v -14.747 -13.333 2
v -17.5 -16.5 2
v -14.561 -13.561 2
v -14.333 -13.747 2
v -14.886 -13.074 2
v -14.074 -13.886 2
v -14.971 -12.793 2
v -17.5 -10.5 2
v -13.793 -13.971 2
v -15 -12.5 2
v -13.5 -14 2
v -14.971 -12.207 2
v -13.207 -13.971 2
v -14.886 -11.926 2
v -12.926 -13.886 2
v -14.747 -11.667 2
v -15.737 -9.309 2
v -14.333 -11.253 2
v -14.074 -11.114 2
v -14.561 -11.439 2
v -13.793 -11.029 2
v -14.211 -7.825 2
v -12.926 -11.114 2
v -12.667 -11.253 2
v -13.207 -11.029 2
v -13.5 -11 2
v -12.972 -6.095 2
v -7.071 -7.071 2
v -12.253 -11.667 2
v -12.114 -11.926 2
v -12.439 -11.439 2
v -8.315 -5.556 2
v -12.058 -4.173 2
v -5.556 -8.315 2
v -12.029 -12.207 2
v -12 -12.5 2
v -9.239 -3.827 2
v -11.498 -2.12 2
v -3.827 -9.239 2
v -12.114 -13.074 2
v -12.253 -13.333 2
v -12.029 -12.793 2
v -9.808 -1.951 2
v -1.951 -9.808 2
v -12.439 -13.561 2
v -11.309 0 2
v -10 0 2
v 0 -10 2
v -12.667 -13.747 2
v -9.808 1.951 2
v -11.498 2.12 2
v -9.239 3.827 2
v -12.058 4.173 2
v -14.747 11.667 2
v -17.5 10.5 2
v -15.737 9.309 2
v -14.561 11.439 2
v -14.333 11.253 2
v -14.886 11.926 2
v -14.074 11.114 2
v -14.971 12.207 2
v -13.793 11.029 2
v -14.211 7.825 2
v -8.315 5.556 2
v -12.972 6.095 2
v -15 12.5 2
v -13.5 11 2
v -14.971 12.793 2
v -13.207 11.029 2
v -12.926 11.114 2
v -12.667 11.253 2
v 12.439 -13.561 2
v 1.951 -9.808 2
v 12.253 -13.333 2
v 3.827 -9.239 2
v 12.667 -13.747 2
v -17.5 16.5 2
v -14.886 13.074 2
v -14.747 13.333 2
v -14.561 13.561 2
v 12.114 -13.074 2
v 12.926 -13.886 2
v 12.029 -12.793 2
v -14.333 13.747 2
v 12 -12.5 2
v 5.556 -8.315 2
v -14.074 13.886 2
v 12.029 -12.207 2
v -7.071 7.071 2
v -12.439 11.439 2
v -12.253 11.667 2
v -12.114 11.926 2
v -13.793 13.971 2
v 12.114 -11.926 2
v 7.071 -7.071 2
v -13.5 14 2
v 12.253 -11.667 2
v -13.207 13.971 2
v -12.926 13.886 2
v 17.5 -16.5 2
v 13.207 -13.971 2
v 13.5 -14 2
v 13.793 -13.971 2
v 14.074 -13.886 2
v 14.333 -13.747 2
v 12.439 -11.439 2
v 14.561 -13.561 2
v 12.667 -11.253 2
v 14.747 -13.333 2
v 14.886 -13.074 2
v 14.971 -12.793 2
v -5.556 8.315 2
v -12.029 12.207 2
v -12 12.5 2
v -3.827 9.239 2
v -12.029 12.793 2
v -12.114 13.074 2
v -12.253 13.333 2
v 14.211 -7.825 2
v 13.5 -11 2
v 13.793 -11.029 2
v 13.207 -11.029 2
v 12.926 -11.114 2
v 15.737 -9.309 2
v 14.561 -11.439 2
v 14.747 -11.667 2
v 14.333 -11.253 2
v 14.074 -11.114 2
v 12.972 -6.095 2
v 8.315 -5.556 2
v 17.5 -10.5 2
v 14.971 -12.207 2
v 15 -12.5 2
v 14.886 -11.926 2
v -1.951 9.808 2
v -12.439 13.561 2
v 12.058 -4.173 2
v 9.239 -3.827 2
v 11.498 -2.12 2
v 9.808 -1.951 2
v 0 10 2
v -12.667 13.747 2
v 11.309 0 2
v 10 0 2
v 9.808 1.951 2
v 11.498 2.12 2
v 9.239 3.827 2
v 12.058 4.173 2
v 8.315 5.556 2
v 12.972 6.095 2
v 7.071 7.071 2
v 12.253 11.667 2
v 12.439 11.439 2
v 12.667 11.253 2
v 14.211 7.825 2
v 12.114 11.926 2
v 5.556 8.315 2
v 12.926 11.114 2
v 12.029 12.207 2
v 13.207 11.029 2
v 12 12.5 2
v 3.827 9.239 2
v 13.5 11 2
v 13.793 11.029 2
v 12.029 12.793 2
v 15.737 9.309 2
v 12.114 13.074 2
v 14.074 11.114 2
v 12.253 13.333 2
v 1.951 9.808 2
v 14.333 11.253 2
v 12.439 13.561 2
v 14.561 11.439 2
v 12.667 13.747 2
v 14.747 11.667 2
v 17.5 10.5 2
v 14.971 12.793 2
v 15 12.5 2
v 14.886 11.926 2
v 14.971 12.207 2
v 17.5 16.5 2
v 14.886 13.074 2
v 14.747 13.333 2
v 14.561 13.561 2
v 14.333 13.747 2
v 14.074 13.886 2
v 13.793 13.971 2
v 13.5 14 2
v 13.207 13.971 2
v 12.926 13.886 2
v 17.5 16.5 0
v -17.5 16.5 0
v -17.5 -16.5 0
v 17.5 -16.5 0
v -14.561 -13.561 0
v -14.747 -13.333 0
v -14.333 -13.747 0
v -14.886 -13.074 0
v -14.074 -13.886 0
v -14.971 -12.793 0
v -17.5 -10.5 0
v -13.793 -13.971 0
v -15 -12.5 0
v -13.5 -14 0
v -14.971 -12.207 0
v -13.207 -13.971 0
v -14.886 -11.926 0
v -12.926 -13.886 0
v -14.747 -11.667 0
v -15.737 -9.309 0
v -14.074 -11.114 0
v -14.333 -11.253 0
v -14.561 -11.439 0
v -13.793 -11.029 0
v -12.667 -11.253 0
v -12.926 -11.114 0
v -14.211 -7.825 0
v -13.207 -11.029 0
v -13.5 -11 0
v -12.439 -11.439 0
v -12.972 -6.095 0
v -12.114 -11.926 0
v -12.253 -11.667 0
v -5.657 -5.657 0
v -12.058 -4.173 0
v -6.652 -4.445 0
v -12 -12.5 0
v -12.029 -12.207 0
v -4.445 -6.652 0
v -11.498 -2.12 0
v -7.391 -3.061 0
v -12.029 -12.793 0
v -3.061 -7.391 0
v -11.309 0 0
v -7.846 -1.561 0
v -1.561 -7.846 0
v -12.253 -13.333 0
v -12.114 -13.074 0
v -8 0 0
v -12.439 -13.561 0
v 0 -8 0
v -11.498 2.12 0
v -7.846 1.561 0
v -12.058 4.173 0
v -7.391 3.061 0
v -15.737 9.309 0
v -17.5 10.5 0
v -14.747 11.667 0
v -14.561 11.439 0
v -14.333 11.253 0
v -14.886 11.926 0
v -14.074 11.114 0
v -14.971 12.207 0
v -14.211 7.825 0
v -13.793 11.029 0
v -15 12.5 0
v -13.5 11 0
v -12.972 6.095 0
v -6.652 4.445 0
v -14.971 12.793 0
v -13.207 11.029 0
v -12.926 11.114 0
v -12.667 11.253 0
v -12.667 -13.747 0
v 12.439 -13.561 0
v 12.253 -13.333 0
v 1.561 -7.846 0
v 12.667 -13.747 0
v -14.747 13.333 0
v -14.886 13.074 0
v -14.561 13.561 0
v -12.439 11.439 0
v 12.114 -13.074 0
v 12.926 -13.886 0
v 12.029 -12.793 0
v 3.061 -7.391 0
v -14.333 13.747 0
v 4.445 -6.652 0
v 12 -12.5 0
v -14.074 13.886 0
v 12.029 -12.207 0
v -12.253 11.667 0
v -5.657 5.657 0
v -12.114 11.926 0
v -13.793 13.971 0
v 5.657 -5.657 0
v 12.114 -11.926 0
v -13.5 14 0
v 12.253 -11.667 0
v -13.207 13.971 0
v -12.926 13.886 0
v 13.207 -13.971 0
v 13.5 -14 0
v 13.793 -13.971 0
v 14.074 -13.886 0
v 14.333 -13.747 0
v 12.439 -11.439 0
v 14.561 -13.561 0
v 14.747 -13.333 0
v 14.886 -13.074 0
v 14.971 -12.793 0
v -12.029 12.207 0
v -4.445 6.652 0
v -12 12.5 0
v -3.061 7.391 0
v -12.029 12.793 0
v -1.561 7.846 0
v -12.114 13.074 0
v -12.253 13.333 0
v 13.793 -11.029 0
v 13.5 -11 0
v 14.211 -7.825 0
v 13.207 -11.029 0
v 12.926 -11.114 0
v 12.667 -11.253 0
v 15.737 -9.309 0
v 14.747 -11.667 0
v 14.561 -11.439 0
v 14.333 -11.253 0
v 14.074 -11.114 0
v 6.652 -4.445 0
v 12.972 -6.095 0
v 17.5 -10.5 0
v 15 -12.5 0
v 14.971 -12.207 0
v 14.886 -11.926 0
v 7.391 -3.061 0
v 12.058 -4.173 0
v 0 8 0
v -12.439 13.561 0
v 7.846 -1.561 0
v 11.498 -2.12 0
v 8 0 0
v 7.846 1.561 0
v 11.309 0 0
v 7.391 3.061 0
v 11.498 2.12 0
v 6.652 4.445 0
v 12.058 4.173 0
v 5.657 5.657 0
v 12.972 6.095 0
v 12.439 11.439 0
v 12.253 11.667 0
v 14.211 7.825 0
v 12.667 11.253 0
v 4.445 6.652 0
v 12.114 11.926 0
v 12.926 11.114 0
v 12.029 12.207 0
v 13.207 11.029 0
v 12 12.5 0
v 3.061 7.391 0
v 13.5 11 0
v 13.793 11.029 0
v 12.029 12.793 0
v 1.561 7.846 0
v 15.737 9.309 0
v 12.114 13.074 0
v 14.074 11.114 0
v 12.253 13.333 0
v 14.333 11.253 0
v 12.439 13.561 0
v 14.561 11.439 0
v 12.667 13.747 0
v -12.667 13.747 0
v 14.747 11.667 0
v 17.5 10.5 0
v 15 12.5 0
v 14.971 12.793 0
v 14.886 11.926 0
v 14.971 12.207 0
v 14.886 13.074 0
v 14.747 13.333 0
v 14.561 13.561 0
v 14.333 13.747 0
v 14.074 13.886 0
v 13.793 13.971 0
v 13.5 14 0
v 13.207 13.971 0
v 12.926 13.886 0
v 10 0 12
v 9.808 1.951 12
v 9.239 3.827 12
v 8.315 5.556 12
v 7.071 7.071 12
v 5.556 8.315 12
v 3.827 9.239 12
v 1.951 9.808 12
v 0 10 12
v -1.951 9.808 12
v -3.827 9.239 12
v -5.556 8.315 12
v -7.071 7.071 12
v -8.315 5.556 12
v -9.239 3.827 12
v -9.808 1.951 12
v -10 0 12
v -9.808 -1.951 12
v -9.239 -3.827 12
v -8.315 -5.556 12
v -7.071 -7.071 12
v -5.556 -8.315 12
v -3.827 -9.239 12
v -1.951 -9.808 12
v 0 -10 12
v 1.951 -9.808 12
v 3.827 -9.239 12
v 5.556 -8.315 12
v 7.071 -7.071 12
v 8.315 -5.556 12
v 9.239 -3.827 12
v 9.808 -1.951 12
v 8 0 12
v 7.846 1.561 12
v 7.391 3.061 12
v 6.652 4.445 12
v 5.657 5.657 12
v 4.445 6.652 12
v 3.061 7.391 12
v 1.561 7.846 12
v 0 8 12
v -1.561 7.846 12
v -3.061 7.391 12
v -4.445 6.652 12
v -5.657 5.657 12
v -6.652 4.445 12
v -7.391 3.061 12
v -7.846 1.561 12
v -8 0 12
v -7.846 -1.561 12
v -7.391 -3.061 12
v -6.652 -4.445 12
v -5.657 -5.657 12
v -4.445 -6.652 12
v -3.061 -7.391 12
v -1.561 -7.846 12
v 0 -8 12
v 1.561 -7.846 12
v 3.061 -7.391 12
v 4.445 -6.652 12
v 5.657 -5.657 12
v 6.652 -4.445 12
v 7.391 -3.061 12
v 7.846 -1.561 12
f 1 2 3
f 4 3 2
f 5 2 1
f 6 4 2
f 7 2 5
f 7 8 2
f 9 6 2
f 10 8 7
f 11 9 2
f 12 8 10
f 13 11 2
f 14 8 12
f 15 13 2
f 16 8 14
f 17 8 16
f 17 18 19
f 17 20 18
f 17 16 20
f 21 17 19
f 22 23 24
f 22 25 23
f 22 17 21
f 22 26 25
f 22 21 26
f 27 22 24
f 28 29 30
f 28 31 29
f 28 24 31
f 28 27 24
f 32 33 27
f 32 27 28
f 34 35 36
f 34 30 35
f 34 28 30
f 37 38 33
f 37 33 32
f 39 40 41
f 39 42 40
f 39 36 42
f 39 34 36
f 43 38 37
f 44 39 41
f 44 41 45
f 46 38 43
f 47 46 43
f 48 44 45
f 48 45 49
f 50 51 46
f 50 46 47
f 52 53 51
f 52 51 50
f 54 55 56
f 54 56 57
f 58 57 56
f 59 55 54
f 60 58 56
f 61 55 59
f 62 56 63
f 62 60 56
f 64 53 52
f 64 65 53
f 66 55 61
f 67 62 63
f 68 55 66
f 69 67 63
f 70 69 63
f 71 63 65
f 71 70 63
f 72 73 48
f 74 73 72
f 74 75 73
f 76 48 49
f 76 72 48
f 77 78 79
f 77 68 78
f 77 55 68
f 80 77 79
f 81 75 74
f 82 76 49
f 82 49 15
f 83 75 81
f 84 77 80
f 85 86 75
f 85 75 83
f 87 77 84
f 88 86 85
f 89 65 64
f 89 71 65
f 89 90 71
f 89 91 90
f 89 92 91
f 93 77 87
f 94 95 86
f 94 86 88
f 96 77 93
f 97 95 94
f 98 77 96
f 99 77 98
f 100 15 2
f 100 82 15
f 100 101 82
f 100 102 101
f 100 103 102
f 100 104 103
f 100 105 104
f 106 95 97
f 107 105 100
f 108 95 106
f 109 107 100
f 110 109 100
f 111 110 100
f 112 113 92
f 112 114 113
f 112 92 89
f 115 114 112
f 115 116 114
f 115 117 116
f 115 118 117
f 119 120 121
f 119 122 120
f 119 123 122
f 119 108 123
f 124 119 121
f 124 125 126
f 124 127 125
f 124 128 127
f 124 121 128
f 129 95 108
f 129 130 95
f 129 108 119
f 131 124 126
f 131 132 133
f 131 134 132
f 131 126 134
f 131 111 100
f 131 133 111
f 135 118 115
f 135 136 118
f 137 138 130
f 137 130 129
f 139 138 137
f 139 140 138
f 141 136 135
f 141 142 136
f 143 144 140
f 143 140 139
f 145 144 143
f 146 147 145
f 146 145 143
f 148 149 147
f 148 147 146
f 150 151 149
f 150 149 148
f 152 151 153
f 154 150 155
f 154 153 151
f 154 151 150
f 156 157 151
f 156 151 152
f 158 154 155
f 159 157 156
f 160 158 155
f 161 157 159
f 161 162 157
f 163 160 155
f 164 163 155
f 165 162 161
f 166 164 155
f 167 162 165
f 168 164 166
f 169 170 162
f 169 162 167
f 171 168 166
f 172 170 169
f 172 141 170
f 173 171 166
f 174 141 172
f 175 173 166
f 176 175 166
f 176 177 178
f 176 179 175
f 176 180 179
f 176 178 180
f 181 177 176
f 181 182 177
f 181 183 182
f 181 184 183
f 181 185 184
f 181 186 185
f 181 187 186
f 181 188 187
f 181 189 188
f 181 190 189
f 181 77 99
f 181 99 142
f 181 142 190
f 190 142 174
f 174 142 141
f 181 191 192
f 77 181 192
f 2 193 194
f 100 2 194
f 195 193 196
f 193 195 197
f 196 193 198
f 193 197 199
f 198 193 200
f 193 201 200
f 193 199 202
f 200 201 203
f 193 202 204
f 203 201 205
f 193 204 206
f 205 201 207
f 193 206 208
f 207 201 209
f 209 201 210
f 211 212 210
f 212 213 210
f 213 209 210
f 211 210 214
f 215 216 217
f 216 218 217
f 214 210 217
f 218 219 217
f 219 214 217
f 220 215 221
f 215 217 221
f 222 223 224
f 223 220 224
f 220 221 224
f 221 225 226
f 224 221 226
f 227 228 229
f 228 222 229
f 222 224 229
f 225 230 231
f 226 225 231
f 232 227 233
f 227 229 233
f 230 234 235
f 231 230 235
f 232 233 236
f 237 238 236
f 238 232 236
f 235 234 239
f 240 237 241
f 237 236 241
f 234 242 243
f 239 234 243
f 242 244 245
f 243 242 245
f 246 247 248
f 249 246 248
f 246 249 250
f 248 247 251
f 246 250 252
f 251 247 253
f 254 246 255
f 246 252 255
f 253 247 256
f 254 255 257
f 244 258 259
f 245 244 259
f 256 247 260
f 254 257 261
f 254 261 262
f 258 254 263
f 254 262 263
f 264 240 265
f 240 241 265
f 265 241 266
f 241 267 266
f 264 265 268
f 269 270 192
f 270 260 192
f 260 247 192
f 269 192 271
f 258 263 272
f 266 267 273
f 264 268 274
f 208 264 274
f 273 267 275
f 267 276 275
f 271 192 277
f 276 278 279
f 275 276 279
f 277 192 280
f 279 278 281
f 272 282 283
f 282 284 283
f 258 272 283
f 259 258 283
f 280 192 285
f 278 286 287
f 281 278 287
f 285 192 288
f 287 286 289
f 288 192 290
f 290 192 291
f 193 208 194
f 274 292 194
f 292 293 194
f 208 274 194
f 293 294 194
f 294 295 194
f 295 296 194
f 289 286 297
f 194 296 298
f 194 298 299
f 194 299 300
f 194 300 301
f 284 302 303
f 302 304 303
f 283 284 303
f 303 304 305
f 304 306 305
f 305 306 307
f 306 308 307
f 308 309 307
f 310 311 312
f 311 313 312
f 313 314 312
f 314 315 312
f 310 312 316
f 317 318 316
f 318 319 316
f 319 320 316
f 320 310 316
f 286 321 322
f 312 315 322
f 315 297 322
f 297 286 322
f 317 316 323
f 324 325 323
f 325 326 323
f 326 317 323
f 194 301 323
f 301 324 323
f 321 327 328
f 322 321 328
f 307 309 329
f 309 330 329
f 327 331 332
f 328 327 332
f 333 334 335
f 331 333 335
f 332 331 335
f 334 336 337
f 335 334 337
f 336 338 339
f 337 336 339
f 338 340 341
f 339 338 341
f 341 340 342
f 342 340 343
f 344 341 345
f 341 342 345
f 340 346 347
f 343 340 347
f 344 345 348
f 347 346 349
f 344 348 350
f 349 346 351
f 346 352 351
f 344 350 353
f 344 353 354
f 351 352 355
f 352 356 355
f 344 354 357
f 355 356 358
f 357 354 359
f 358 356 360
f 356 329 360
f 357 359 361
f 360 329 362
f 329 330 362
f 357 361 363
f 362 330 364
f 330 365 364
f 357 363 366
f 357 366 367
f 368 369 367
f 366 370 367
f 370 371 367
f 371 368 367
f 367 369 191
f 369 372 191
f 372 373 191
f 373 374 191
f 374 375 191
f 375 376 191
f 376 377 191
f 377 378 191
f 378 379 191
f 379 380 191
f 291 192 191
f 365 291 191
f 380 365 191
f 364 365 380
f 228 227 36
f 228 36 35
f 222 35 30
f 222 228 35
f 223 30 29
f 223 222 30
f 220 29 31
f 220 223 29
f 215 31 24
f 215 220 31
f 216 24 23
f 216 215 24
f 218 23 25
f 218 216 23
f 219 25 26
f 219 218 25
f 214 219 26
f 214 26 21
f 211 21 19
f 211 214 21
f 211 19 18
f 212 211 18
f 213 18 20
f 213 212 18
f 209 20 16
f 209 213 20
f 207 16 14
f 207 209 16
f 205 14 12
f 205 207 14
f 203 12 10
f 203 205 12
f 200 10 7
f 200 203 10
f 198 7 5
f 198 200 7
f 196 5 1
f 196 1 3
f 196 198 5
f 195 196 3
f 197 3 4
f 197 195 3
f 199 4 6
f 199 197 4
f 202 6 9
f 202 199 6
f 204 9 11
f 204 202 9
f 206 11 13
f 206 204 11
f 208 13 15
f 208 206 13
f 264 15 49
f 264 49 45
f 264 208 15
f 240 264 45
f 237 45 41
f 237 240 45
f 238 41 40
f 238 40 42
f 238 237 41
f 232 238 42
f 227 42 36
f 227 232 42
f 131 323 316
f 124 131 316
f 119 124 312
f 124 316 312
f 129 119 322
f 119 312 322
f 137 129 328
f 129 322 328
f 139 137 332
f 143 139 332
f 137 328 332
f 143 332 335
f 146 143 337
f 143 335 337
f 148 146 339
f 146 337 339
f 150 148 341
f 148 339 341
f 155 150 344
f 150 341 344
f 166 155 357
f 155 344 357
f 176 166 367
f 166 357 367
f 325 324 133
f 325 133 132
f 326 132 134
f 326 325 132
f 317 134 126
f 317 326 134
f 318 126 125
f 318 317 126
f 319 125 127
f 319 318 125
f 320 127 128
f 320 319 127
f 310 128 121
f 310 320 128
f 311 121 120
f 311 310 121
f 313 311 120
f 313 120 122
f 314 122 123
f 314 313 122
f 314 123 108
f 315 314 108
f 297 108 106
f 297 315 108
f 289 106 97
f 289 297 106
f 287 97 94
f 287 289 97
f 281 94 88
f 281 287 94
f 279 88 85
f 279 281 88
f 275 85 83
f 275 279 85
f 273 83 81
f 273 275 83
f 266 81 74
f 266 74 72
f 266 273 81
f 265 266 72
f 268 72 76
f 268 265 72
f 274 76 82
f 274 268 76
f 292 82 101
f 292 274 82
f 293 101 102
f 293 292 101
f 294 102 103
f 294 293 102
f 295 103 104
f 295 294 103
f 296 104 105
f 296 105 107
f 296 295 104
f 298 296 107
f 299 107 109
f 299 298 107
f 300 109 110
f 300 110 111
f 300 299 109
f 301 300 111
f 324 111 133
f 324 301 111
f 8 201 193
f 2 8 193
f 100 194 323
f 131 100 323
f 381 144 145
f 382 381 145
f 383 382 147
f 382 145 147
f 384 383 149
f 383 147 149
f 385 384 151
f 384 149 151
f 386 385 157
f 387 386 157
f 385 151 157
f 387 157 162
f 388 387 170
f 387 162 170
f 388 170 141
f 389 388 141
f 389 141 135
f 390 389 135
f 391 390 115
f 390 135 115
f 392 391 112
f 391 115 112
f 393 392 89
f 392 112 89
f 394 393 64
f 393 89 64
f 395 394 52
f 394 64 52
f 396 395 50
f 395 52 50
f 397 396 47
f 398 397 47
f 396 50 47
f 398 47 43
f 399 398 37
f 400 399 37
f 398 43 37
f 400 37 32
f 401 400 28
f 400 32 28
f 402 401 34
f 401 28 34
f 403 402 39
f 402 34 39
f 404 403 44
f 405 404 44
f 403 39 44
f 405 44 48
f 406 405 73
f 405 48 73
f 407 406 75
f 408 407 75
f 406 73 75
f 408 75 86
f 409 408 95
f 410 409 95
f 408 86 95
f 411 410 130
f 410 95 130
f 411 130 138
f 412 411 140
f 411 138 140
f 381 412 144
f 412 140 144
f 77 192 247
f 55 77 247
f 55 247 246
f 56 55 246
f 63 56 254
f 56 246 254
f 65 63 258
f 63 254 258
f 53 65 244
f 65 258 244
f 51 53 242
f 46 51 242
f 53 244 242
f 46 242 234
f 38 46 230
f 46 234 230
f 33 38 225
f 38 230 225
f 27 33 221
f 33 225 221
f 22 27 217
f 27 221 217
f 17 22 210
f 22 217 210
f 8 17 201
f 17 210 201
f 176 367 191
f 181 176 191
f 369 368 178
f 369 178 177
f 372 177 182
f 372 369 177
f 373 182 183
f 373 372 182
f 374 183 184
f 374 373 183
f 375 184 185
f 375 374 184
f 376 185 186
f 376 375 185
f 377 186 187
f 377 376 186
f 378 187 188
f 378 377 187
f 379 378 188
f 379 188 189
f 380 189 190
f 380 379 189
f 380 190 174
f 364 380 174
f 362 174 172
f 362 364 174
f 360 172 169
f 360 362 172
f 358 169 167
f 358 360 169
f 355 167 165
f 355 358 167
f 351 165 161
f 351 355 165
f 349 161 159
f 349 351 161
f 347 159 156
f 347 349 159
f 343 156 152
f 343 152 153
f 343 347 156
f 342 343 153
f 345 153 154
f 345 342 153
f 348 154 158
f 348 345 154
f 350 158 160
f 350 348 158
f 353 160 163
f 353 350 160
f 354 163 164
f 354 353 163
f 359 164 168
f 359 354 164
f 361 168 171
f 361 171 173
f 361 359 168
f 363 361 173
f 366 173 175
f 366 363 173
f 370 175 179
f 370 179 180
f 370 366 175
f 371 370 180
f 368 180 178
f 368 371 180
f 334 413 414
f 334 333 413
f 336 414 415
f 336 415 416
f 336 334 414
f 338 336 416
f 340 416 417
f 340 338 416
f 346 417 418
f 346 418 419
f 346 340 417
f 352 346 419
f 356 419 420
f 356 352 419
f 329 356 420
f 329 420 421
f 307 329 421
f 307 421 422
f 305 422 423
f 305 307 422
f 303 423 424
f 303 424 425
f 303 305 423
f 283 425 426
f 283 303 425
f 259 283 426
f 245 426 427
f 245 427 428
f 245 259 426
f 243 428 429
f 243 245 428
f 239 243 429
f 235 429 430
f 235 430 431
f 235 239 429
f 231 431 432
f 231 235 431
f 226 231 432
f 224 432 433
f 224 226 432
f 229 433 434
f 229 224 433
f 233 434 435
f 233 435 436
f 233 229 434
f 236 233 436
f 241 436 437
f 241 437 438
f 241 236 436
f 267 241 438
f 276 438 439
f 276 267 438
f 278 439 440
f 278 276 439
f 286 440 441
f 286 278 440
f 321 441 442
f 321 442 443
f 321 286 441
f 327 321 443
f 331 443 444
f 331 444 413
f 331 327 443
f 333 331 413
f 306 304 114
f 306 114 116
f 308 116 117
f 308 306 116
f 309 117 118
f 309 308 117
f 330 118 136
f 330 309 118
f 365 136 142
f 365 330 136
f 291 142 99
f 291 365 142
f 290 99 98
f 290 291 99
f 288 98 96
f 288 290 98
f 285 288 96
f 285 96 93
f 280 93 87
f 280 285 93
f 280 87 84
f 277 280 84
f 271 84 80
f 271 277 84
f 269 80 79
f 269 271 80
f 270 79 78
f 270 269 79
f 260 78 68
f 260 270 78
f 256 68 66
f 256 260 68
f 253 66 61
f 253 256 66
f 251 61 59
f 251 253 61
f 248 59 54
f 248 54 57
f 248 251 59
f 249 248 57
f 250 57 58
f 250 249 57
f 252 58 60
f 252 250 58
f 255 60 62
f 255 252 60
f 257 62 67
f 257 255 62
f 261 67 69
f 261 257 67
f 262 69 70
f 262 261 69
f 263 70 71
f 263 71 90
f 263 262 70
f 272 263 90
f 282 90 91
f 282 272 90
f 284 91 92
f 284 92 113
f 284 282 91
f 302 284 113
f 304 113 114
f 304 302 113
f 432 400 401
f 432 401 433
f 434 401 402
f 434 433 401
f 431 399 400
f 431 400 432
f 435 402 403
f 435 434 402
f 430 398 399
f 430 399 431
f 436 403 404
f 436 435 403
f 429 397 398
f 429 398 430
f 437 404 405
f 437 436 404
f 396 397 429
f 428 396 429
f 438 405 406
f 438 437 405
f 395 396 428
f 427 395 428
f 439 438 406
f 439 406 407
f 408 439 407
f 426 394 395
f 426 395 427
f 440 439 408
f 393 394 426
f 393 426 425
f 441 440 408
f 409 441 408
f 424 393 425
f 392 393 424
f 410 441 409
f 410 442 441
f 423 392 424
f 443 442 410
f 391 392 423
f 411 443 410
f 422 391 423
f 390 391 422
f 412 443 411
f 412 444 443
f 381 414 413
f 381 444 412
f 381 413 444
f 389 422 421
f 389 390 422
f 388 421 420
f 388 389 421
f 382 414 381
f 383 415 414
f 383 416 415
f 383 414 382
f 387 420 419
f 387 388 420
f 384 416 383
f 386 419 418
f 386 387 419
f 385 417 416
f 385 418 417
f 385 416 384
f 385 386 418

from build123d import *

# Parameters (mm, degrees)
SKETCH_1_R      = 1.5
SKETCH_1_R_2    = 8
EXTRUDE_1_DEPTH = 2
SKETCH_3_R      = 10
SKETCH_3_R_2    = 8
EXTRUDE_2_DEPTH = 10


with BuildPart() as part:
    # 草图1 → 凸台-拉伸1 (new body)
    with BuildSketch(Plane.XY):
        with BuildLine():
            Line((17.5, 16.5), (-17.5, 16.5))
            Line((-17.5, 16.5), (-17.5, 10.5))
            ThreePointArc((-17.5, 10.5), (-11.309475019, 0), (-17.5, -10.5))
            Line((-17.5, -10.5), (-17.5, -16.5))
            Line((-17.5, -16.5), (17.5, -16.5))
            Line((17.5, -16.5), (17.5, -10.5))
            ThreePointArc((17.5, -10.5), (11.309475019, 0), (17.5, 10.5))
            Line((17.5, 10.5), (17.5, 16.5))
        make_face()
        with Locations((-13.5, -12.5)):
            Circle(SKETCH_1_R, mode=Mode.SUBTRACT)
        with Locations((13.5, -12.5)):
            Circle(SKETCH_1_R, mode=Mode.SUBTRACT)
        Circle(SKETCH_1_R_2, mode=Mode.SUBTRACT)
        with Locations((-13.5, 12.5)):
            Circle(SKETCH_1_R, mode=Mode.SUBTRACT)
        with Locations((13.5, 12.5)):
            Circle(SKETCH_1_R, mode=Mode.SUBTRACT)
    extrude(amount=EXTRUDE_1_DEPTH)

    # 草图3 → 凸台-拉伸2 (add)
    with BuildSketch(Plane.XY.offset(2)):
        Circle(SKETCH_3_R)
        Circle(SKETCH_3_R_2, mode=Mode.SUBTRACT)
    extrude(amount=EXTRUDE_2_DEPTH)


solid = part.part
